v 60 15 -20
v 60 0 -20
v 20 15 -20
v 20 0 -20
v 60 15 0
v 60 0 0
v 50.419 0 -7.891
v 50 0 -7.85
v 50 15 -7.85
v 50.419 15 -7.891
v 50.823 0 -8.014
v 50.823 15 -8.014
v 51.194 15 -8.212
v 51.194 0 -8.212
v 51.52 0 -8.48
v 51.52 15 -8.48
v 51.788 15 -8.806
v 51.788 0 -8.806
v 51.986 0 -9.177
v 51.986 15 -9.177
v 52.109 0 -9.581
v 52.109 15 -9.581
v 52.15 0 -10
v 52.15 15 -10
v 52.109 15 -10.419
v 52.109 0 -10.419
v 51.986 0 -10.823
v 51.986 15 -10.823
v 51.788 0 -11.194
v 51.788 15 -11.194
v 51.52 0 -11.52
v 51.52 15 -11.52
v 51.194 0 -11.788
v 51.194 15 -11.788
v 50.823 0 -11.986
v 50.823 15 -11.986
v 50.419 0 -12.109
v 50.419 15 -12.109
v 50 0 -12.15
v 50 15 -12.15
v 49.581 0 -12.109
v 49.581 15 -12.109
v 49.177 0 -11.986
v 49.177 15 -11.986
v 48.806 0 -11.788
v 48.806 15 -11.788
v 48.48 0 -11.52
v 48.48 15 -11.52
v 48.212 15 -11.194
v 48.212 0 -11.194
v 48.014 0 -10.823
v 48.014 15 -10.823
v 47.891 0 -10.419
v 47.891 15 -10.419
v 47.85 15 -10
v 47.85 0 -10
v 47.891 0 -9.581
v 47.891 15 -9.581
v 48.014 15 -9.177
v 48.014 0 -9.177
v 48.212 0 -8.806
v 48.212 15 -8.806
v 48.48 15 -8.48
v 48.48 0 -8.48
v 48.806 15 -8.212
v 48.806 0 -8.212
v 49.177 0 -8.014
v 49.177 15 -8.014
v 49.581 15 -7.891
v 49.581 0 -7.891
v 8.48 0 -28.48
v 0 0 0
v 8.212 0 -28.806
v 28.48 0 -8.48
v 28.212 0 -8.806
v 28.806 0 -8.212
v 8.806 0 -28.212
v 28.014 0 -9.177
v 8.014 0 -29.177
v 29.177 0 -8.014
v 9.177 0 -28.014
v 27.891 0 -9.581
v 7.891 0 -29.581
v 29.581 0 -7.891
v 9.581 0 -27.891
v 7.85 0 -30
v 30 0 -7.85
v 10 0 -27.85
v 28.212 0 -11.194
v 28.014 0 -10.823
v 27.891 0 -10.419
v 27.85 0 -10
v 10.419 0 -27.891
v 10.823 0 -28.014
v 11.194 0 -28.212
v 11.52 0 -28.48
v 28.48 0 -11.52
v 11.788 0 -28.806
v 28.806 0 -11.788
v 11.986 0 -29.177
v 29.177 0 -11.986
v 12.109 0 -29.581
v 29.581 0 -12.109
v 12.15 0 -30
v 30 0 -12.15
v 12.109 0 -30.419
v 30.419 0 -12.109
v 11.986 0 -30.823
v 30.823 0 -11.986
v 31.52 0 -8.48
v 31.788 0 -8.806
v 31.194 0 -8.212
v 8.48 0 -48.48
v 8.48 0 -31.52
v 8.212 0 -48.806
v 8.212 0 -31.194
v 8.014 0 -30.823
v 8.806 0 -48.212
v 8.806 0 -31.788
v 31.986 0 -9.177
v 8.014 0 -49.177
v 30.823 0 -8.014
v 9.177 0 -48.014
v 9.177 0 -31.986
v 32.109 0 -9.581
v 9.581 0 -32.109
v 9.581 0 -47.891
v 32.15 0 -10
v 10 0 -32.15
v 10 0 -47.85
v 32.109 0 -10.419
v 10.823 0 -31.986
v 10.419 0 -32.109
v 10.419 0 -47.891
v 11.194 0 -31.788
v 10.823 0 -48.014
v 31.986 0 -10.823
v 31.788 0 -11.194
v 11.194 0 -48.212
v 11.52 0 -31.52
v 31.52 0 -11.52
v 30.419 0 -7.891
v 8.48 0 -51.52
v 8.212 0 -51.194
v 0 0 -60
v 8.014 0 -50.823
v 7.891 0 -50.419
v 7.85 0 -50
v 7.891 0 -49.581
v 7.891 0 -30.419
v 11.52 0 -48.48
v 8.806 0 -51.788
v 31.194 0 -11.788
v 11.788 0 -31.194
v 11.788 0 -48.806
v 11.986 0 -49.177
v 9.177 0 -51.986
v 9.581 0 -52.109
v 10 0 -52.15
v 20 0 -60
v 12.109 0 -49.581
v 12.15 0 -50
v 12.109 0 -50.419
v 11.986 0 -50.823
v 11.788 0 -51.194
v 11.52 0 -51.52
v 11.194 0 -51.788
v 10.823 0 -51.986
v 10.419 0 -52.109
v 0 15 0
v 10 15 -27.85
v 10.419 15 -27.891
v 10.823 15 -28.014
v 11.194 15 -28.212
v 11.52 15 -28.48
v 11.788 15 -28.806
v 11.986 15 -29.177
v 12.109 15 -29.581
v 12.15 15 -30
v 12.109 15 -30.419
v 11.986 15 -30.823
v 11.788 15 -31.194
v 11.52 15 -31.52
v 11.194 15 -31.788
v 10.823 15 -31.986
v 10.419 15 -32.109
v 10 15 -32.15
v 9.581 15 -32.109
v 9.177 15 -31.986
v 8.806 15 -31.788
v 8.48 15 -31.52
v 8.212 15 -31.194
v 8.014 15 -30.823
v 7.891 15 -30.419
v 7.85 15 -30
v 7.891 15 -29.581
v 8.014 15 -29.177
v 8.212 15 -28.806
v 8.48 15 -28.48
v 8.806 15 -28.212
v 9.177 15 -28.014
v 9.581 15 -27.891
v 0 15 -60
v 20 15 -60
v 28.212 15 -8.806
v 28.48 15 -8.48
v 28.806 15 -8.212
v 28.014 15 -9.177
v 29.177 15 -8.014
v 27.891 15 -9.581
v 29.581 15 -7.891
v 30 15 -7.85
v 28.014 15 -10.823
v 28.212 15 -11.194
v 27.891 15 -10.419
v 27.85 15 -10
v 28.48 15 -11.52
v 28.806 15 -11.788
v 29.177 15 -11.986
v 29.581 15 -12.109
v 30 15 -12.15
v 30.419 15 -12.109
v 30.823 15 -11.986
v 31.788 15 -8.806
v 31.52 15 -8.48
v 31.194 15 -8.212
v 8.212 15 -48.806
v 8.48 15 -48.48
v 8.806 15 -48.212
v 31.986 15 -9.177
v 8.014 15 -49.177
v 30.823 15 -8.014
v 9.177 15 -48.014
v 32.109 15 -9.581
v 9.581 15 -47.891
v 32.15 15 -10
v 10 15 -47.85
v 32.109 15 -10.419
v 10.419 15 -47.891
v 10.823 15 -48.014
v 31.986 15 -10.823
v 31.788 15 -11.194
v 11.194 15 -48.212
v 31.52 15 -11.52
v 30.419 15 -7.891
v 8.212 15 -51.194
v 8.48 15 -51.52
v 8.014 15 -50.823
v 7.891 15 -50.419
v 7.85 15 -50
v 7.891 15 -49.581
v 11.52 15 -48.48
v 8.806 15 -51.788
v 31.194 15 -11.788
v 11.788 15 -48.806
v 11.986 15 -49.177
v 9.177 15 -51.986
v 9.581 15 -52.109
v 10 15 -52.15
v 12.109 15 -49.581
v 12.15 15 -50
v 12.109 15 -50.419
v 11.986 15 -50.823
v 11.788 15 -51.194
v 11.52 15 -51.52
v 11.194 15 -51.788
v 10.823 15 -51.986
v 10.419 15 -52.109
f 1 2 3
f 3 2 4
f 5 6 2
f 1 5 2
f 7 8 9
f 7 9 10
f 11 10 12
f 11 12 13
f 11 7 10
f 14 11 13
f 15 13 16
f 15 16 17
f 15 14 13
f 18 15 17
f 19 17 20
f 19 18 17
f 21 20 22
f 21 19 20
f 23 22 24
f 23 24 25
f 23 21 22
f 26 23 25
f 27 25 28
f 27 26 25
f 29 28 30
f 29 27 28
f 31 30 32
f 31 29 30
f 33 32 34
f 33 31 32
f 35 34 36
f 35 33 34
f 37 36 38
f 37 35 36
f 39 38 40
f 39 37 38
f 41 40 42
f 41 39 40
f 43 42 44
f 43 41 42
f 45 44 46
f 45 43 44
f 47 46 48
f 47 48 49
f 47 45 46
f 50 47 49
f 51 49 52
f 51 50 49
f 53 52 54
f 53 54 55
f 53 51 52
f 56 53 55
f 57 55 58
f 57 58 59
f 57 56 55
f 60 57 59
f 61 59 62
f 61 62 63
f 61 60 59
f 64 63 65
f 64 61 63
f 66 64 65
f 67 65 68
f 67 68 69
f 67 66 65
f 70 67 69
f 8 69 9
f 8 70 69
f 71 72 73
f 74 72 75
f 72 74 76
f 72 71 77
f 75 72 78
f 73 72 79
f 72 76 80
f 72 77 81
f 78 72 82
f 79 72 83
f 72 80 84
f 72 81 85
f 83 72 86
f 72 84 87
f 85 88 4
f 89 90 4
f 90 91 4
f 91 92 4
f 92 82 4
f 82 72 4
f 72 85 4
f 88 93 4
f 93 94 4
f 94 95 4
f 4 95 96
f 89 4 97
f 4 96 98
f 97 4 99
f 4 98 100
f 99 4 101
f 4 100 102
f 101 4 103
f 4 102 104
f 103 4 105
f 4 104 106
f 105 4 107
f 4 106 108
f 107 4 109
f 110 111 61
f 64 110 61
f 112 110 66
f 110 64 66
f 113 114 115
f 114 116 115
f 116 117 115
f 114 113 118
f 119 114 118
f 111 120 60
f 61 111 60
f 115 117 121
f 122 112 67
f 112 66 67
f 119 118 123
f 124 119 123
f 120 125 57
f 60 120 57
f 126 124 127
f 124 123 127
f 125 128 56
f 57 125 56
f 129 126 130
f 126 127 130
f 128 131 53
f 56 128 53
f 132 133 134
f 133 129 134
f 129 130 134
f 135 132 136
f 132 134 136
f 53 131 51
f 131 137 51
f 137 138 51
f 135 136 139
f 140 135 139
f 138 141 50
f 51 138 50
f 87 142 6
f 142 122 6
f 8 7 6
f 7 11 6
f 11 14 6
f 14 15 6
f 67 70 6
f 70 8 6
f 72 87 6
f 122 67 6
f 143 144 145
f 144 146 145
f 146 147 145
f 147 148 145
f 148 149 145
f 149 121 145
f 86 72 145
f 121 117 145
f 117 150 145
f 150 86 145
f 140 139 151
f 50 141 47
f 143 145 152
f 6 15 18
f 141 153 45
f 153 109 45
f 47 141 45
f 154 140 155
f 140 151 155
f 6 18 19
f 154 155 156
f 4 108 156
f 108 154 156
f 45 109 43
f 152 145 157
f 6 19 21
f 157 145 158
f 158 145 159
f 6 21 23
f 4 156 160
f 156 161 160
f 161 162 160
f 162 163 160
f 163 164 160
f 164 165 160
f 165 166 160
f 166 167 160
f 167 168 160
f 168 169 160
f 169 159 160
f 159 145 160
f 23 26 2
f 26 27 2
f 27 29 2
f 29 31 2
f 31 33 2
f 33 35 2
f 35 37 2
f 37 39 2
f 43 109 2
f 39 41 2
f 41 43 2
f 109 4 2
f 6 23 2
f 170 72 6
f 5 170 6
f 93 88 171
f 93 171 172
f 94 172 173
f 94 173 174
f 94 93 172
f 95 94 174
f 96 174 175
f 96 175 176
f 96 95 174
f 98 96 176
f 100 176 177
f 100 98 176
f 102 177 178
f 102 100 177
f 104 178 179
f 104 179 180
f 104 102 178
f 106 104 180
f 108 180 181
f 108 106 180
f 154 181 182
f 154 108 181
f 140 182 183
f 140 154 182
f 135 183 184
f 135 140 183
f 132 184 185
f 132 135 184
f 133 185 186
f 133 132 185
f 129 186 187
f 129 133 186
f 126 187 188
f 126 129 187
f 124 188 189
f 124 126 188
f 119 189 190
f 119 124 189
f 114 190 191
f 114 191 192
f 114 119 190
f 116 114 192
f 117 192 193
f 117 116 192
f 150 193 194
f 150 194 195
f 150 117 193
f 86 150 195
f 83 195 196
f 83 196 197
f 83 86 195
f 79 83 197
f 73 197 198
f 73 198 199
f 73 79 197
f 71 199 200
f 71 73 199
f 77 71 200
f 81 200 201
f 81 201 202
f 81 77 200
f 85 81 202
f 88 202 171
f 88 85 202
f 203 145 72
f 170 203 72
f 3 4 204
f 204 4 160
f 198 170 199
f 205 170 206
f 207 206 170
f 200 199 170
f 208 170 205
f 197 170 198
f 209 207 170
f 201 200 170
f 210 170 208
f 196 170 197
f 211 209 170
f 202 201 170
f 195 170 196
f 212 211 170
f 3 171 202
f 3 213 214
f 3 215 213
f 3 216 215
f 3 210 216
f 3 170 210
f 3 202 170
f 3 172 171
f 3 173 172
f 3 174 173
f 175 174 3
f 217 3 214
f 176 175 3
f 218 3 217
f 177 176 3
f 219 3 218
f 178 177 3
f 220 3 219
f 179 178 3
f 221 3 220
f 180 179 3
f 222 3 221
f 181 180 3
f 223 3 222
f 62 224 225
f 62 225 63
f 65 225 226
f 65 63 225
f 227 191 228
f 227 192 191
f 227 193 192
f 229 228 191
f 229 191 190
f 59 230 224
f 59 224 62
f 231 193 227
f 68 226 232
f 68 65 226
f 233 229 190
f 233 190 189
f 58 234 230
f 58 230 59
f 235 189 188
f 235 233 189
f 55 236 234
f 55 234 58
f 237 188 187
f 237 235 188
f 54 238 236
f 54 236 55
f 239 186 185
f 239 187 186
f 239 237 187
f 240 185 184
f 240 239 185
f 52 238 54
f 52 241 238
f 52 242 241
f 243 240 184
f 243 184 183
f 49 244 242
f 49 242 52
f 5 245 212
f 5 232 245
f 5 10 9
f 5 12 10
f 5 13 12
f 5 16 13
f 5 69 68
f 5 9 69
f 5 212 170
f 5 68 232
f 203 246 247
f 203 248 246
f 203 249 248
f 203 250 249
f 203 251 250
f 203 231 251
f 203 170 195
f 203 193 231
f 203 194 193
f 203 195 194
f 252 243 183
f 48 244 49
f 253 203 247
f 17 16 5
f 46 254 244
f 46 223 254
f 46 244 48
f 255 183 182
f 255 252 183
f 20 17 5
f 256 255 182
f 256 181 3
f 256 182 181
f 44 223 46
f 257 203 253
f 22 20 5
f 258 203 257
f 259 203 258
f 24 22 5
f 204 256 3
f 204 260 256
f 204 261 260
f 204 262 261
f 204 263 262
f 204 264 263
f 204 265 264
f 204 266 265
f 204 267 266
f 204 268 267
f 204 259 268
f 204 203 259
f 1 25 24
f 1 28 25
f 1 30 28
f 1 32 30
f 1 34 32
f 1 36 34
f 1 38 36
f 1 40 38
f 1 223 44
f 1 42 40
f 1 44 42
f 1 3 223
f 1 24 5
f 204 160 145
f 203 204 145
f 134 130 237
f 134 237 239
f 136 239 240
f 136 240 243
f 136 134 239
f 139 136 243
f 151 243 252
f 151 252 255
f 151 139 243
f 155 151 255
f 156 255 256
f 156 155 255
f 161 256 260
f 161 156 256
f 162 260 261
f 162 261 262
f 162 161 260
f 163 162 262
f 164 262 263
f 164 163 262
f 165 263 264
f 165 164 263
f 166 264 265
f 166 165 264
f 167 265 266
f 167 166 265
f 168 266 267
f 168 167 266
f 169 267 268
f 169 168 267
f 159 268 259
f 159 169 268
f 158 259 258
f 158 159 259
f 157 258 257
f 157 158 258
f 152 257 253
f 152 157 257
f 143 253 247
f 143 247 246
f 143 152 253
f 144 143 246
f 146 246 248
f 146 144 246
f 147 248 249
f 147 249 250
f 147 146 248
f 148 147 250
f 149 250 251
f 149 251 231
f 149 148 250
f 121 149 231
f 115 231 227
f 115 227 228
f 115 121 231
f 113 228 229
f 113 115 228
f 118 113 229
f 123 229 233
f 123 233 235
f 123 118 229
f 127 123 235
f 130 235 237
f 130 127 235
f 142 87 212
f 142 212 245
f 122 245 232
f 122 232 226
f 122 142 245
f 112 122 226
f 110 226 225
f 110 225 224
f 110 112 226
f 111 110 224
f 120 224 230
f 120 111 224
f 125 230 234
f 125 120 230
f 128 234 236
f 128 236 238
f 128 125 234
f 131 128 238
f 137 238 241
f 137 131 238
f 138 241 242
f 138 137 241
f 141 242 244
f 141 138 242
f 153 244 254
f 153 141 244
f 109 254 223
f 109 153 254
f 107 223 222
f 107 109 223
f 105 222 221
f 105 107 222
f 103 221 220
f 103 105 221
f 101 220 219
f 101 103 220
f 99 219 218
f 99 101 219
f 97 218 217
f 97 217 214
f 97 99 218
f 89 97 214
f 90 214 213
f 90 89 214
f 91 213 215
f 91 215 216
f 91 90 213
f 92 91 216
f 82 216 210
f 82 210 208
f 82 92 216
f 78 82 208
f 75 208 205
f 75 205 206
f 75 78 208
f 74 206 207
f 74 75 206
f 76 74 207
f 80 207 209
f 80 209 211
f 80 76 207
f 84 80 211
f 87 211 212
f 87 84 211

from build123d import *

# Parameters (mm, degrees)
SKETCH1_R           = 2.15
BOSS_EXTRUDE1_DEPTH = 15


with BuildPart() as part:
    # Sketch1 → Boss-Extrude1 (new body)
    with BuildSketch(Plane(origin=(0, 0, 0), x_dir=(1, 0, 0), z_dir=(0, 1, 0))):
        Polygon((0, 0), (60, 0), (60, 20), (20, 20), (20, 60), (0, 60), align=None)
        with Locations(Location((50, 10, 0), (0, 0, 270))):
            Circle(SKETCH1_R, mode=Mode.SUBTRACT)
        with Locations(Location((30, 10, 0), (0, 0, 270))):
            Circle(SKETCH1_R, mode=Mode.SUBTRACT)
        with Locations(Location((10, 50, 0), (0, 0, 270))):
            Circle(SKETCH1_R, mode=Mode.SUBTRACT)
        with Locations(Location((10, 30, 0), (0, 0, 270))):
            Circle(SKETCH1_R, mode=Mode.SUBTRACT)
    extrude(amount=BOSS_EXTRUDE1_DEPTH)


solid = part.part
